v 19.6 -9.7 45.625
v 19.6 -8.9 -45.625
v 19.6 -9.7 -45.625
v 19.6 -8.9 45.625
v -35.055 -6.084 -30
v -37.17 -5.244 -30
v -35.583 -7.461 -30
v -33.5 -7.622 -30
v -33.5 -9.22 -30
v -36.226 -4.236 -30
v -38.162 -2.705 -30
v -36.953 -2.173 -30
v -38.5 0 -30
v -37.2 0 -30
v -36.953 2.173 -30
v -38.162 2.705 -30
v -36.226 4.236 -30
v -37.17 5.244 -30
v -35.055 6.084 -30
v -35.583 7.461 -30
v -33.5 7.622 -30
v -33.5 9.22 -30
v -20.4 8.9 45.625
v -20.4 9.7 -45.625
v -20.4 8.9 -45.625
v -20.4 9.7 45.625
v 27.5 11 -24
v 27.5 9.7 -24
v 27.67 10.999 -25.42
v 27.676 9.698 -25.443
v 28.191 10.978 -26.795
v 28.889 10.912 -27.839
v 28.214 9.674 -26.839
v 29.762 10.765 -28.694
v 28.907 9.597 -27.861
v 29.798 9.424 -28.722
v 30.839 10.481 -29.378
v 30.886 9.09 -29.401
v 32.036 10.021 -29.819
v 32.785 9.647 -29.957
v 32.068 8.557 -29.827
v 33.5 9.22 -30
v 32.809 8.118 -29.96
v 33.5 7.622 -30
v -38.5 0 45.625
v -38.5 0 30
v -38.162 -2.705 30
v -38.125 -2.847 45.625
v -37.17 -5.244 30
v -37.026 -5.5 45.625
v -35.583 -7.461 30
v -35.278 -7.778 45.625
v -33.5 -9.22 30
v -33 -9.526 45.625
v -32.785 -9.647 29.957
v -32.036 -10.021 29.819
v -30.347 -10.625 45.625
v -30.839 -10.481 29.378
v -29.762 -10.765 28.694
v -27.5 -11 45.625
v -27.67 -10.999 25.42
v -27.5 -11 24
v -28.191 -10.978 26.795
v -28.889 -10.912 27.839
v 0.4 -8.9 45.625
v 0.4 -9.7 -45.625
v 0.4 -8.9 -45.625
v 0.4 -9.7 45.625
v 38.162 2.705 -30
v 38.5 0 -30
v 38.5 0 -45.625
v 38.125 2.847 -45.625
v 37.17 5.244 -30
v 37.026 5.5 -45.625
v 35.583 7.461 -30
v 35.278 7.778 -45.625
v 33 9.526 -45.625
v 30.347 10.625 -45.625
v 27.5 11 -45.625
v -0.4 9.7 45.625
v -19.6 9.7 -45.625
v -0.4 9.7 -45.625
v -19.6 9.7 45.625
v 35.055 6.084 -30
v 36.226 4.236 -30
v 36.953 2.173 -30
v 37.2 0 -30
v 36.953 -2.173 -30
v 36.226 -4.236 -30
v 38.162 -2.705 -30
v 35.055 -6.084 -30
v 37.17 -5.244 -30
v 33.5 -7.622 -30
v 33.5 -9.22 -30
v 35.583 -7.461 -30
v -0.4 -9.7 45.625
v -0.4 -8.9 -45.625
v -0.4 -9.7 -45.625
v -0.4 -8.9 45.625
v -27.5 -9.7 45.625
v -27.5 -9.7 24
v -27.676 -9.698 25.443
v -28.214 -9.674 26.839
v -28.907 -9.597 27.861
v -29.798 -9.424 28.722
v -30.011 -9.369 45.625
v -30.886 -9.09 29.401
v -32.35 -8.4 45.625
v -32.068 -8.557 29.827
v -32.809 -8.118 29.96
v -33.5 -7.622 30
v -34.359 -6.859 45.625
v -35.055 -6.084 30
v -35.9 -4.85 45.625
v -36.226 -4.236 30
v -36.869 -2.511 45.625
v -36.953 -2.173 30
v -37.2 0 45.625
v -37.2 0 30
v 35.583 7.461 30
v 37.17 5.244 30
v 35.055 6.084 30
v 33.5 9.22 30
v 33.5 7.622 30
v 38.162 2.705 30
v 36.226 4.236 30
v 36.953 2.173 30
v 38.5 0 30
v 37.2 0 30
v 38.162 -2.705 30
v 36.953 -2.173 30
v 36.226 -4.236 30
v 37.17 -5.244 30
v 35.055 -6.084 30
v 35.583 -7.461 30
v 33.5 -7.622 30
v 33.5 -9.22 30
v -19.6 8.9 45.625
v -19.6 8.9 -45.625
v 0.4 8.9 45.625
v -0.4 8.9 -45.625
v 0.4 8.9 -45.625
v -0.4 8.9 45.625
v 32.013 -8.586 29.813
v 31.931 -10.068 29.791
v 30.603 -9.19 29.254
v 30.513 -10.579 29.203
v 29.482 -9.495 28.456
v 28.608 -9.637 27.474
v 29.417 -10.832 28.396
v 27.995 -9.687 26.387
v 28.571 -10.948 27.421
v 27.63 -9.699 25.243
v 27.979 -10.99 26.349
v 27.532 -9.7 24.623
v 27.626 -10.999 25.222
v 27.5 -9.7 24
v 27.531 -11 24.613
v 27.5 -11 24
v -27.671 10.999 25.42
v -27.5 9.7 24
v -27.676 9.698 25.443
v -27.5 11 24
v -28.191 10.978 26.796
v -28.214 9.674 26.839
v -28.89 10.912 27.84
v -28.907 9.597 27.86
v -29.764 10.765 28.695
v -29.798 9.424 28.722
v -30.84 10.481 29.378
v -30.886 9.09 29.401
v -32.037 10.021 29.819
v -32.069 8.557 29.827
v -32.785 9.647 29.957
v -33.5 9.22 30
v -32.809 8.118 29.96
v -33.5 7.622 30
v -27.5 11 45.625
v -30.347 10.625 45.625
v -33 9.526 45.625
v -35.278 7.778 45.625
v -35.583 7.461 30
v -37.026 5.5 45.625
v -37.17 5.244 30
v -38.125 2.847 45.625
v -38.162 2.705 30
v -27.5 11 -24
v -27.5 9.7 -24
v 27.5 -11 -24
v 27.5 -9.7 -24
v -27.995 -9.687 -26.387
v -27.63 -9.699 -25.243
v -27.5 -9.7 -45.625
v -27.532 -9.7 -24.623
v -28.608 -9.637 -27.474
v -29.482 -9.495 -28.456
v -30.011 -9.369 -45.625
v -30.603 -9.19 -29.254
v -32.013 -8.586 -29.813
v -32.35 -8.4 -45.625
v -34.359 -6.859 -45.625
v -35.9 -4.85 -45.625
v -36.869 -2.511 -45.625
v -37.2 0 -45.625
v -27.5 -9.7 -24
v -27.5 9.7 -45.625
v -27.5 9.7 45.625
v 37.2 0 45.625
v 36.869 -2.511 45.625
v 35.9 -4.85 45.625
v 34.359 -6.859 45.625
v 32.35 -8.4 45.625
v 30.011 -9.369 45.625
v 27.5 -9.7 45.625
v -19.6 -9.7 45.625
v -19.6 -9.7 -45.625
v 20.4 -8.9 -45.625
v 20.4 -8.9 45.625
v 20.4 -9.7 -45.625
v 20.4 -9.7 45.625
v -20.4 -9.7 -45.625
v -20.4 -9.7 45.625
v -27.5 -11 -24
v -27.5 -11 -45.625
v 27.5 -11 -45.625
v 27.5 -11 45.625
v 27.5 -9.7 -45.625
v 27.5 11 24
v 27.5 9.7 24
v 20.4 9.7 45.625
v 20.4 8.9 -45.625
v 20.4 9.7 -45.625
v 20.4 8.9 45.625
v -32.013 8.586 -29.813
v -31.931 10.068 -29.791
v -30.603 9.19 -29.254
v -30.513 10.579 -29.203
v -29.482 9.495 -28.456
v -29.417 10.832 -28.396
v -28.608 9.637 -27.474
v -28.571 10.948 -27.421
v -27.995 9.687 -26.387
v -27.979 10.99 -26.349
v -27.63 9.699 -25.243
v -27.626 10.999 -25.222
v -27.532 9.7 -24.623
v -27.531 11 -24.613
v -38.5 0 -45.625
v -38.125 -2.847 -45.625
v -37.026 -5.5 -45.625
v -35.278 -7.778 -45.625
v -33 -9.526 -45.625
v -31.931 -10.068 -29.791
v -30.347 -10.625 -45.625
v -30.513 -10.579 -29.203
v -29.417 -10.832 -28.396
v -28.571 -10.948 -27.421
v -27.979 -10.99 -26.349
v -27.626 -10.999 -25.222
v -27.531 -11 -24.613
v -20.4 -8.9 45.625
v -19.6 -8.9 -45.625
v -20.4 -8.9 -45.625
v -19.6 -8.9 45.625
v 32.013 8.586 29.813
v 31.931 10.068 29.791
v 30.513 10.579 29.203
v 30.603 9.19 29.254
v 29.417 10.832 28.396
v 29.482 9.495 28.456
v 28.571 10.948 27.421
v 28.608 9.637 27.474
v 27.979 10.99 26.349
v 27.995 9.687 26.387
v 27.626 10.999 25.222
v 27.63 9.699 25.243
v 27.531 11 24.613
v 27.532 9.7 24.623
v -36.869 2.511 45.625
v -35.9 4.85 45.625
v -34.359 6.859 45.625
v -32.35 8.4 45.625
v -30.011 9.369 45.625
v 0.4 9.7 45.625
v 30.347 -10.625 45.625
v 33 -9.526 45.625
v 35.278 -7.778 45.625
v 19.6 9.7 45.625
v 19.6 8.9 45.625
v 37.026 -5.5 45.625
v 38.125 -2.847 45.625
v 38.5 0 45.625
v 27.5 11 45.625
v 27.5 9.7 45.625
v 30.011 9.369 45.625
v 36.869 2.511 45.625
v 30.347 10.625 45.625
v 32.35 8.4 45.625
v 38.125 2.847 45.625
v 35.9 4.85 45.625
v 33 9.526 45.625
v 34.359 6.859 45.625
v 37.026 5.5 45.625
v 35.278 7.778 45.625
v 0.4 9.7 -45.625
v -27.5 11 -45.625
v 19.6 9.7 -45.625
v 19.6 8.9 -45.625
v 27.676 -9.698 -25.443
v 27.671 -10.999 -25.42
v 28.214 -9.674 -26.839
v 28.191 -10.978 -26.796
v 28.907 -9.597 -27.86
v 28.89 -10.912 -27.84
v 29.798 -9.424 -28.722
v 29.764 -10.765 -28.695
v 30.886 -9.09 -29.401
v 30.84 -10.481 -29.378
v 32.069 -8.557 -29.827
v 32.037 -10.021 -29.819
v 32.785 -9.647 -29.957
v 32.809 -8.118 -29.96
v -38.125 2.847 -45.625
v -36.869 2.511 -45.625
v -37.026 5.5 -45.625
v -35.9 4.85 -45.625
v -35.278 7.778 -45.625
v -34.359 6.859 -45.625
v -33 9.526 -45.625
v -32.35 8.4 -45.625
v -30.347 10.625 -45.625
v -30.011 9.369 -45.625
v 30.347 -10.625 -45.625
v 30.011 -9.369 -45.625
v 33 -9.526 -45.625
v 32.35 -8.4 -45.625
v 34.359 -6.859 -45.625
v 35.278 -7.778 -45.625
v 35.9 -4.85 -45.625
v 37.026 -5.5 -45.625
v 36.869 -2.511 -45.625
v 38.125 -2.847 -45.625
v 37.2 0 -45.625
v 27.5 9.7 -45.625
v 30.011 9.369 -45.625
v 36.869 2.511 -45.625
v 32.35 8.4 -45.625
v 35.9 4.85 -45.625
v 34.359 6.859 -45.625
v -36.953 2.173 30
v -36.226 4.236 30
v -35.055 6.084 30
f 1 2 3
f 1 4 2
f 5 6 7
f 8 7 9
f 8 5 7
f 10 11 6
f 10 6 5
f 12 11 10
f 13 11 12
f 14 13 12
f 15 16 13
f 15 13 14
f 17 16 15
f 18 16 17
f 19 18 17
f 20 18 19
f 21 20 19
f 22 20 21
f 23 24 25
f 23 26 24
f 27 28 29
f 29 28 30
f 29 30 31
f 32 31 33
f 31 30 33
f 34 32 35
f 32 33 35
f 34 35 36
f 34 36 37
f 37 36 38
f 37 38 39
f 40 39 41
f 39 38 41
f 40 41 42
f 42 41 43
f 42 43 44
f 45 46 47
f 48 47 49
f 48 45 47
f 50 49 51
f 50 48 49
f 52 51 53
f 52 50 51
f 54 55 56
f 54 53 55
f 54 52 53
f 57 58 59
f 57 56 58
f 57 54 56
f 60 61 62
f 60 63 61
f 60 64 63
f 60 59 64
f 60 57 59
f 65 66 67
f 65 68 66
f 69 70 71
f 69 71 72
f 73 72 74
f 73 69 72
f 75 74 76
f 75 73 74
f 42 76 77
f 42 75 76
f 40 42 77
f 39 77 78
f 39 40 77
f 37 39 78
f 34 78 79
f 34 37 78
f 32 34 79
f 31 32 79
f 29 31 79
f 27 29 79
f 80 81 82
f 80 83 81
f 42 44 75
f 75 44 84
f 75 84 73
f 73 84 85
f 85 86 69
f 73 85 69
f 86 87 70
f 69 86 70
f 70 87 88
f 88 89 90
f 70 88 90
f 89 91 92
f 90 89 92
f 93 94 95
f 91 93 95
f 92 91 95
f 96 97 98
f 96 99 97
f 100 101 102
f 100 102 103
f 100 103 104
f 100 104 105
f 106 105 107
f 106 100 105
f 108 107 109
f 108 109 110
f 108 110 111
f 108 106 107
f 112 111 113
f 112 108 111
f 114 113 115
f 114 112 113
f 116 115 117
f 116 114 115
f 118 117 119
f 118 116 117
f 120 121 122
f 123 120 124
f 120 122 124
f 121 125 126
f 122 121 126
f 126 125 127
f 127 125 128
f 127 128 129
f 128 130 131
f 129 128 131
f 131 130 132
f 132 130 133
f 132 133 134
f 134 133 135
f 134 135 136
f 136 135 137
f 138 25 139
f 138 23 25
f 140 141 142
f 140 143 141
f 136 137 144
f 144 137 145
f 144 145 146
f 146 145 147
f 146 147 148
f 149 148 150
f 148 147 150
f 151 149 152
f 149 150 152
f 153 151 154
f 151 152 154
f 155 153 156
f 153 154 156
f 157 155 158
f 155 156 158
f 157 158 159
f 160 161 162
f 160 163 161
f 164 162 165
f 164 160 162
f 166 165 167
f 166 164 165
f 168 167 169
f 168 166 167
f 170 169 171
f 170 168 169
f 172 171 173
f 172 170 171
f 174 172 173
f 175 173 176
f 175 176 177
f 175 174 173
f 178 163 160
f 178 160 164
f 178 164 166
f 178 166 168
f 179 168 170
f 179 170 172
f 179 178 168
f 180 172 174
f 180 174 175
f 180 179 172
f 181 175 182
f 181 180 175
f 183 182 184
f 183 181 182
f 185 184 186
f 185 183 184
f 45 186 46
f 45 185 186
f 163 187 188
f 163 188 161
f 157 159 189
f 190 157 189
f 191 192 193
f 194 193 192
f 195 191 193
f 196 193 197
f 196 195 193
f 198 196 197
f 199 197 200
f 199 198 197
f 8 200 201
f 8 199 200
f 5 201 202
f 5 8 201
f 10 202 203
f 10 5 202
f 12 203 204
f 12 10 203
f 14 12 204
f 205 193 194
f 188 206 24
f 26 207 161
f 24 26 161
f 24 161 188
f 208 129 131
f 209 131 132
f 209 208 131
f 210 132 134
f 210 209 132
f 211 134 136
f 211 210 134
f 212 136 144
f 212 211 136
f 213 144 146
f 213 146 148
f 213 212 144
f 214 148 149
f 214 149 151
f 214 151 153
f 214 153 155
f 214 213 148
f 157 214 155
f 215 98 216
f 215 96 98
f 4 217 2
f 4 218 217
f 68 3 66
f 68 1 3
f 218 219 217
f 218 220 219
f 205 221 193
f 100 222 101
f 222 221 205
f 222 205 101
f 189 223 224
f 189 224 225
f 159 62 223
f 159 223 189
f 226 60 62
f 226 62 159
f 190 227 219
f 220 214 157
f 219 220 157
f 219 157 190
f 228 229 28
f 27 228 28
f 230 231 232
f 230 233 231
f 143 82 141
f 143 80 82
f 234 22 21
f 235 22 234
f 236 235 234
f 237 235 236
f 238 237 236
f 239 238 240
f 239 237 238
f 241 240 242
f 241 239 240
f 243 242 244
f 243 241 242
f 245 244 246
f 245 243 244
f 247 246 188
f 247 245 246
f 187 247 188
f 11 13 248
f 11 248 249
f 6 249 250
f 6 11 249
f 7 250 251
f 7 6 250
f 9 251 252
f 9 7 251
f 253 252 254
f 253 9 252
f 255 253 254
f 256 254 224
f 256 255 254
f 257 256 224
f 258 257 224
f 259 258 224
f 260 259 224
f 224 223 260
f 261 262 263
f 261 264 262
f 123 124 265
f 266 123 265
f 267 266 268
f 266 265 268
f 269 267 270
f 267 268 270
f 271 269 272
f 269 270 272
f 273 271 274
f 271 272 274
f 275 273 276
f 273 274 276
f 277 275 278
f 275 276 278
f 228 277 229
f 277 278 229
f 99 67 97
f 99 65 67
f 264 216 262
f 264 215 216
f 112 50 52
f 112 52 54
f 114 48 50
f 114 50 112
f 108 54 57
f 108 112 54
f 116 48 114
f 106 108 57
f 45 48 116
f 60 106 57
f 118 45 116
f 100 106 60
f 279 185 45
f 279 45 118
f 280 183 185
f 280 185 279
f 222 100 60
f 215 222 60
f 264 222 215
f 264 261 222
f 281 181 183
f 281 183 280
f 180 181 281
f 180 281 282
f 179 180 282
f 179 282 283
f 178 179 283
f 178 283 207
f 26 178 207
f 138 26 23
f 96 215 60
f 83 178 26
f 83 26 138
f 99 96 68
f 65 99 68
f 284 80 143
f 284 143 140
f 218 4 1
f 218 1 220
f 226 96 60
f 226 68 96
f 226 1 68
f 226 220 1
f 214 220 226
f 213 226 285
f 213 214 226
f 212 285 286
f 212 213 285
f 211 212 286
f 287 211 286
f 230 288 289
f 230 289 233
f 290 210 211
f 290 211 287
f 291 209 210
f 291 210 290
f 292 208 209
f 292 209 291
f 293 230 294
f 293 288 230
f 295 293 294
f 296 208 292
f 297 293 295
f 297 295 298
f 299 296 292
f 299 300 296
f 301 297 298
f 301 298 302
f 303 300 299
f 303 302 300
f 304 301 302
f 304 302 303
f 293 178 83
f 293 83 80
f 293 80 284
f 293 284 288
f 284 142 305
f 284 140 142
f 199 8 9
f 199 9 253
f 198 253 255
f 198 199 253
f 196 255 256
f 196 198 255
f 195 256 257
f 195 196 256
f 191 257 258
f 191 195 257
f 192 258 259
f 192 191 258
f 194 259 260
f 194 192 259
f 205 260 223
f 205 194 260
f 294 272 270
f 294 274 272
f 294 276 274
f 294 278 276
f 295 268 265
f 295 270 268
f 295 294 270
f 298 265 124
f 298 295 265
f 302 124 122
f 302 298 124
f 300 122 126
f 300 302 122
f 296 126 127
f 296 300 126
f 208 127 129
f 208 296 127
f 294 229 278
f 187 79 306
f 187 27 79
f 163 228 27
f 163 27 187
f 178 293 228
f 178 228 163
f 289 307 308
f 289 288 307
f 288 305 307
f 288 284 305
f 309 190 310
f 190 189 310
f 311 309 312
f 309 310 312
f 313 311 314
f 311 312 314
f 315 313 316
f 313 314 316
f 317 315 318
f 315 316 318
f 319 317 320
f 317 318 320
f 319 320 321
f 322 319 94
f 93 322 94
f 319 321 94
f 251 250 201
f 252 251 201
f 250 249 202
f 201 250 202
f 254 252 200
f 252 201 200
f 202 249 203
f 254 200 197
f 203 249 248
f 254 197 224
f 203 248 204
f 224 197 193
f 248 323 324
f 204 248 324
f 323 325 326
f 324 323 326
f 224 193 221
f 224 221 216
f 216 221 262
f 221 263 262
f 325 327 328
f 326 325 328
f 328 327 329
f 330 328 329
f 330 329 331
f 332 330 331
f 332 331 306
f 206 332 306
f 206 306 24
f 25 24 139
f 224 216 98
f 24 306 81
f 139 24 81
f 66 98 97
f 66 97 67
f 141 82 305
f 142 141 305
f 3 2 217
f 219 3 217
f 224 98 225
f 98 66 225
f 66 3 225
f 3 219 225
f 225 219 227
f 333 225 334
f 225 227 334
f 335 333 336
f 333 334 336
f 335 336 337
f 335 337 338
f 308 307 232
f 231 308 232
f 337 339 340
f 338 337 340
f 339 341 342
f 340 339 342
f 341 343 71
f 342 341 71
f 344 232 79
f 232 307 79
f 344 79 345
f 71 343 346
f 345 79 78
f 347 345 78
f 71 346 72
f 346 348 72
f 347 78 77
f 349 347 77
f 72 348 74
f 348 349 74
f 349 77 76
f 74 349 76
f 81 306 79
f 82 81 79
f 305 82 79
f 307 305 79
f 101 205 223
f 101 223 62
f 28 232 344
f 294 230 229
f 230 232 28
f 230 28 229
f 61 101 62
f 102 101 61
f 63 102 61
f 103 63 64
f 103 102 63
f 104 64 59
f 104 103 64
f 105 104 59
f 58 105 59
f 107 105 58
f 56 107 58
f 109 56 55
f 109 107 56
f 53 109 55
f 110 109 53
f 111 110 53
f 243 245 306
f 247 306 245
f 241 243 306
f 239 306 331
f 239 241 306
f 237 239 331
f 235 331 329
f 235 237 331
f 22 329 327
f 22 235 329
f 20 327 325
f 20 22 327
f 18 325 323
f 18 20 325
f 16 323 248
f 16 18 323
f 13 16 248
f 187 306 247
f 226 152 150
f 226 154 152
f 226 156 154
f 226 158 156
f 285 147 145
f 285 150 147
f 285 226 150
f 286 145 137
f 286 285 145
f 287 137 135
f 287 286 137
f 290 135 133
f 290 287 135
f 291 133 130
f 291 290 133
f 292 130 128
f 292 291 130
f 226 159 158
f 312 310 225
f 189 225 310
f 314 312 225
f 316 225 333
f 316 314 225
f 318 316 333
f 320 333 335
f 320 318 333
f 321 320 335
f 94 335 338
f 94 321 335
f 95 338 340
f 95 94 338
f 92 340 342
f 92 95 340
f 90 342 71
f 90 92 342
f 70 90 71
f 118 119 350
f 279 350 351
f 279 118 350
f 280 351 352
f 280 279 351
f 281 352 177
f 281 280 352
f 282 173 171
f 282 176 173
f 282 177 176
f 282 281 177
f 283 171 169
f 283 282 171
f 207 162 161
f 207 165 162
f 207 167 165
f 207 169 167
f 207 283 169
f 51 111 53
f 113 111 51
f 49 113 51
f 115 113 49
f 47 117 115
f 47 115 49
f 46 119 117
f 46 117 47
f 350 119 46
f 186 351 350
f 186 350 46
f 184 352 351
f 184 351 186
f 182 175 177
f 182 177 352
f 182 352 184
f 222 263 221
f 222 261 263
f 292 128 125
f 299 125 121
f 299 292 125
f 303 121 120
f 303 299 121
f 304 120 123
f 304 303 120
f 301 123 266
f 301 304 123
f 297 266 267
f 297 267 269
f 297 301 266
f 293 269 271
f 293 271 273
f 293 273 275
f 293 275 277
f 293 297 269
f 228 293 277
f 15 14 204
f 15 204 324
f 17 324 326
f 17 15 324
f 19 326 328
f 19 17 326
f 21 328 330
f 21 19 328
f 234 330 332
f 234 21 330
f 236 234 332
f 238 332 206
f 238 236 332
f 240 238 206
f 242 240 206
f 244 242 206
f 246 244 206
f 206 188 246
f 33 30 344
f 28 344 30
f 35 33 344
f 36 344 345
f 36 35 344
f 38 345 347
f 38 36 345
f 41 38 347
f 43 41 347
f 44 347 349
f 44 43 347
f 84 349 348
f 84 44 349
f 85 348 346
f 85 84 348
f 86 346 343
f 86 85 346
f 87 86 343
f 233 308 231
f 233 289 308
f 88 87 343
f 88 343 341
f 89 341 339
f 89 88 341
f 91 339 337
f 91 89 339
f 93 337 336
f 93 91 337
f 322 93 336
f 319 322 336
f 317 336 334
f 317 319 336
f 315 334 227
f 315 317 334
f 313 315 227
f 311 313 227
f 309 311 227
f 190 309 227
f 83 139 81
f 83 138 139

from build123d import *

# Parameters (mm, degrees)
F1_DEPTH = 45.625
F3_DEPTH = 12.5


with BuildPart() as f1:
    # F0 (on Top) → F1 (new body, symmetric)
    with BuildSketch(Plane.XY):
        with BuildLine():
            Line((27.5, 11), (-27.5, 11))
            ThreePointArc((-27.5, 11), (-35.278175, 7.778175), (-38.5, 0))
            ThreePointArc((-38.5, 0), (-35.278175, -7.778175), (-27.5, -11))
            Line((-27.5, -11), (27.5, -11))
            ThreePointArc((27.5, -11), (35.278175, -7.778175), (38.5, 0))
            ThreePointArc((38.5, 0), (35.278175, 7.778175), (27.5, 11))
        make_face()
        with BuildLine():
            ThreePointArc((-37.2, 0), (-34.358936, 6.858936), (-27.5, 9.7))
            Line((-27.5, 9.7), (-20.4, 9.7))
            Line((-20.4, 9.7), (-20.4, 8.9))
            Line((-20.4, 8.9), (-19.6, 8.9))
            Line((-19.6, 8.9), (-19.6, 9.7))
            Line((-19.6, 9.7), (-0.4, 9.7))
            Line((-0.4, 9.7), (-0.4, 8.9))
            Line((-0.4, 8.9), (0.4, 8.9))
            Line((0.4, 8.9), (0.4, 9.7))
            Line((0.4, 9.7), (19.6, 9.7))
            Line((19.6, 9.7), (19.6, 8.9))
            Line((19.6, 8.9), (20.4, 8.9))
            Line((20.4, 8.9), (20.4, 9.7))
            Line((20.4, 9.7), (27.5, 9.7))
            ThreePointArc((27.5, 9.7), (34.358936, 6.858936), (37.2, 0))
            ThreePointArc((37.2, 0), (34.358936, -6.858936), (27.5, -9.7))
            Line((27.5, -9.7), (20.4, -9.7))
            Line((20.4, -9.7), (20.4, -8.9))
            Line((20.4, -8.9), (19.6, -8.9))
            Line((19.6, -8.9), (19.6, -9.7))
            Line((19.6, -9.7), (0.4, -9.7))
            Line((0.4, -9.7), (0.4, -8.9))
            Line((0.4, -8.9), (-0.4, -8.9))
            Line((-0.4, -8.9), (-0.4, -9.7))
            Line((-0.4, -9.7), (-19.6, -9.7))
            Line((-19.6, -9.7), (-19.6, -8.9))
            Line((-19.6, -8.9), (-20.4, -8.9))
            Line((-20.4, -8.9), (-20.4, -9.7))
            Line((-20.4, -9.7), (-27.5, -9.7))
            ThreePointArc((-27.5, -9.7), (-34.358936, -6.858936), (-37.2, 0))
        make_face(mode=Mode.SUBTRACT)
    extrude(amount=F1_DEPTH, both=True)

    # F2 (on Front) → F3 (cut, symmetric)
    with BuildSketch(Plane.XZ):
        with BuildLine():
            ThreePointArc((-27.5, 24), (-29.257359, 28.242641), (-33.5, 30))
            Line((-33.5, 30), (-38.5, 30))
            Line((-38.5, 30), (-38.5, -30))
            Line((-38.5, -30), (-33.5, -30))
            ThreePointArc((-33.5, -30), (-29.257359, -28.242641), (-27.5, -24))
            Line((-27.5, -24), (-27.5, 24))
        make_face()
        with BuildLine():
            ThreePointArc((33.5, 30), (29.257359, 28.242641), (27.5, 24))
            Line((27.5, 24), (27.5, -24))
            ThreePointArc((27.5, -24), (29.257359, -28.242641), (33.5, -30))
            Line((33.5, -30), (38.5, -30))
            Line((38.5, -30), (38.5, 30))
            Line((38.5, 30), (33.5, 30))
        make_face()
    extrude(amount=F3_DEPTH, both=True, mode=Mode.SUBTRACT)


solid = f1.part
